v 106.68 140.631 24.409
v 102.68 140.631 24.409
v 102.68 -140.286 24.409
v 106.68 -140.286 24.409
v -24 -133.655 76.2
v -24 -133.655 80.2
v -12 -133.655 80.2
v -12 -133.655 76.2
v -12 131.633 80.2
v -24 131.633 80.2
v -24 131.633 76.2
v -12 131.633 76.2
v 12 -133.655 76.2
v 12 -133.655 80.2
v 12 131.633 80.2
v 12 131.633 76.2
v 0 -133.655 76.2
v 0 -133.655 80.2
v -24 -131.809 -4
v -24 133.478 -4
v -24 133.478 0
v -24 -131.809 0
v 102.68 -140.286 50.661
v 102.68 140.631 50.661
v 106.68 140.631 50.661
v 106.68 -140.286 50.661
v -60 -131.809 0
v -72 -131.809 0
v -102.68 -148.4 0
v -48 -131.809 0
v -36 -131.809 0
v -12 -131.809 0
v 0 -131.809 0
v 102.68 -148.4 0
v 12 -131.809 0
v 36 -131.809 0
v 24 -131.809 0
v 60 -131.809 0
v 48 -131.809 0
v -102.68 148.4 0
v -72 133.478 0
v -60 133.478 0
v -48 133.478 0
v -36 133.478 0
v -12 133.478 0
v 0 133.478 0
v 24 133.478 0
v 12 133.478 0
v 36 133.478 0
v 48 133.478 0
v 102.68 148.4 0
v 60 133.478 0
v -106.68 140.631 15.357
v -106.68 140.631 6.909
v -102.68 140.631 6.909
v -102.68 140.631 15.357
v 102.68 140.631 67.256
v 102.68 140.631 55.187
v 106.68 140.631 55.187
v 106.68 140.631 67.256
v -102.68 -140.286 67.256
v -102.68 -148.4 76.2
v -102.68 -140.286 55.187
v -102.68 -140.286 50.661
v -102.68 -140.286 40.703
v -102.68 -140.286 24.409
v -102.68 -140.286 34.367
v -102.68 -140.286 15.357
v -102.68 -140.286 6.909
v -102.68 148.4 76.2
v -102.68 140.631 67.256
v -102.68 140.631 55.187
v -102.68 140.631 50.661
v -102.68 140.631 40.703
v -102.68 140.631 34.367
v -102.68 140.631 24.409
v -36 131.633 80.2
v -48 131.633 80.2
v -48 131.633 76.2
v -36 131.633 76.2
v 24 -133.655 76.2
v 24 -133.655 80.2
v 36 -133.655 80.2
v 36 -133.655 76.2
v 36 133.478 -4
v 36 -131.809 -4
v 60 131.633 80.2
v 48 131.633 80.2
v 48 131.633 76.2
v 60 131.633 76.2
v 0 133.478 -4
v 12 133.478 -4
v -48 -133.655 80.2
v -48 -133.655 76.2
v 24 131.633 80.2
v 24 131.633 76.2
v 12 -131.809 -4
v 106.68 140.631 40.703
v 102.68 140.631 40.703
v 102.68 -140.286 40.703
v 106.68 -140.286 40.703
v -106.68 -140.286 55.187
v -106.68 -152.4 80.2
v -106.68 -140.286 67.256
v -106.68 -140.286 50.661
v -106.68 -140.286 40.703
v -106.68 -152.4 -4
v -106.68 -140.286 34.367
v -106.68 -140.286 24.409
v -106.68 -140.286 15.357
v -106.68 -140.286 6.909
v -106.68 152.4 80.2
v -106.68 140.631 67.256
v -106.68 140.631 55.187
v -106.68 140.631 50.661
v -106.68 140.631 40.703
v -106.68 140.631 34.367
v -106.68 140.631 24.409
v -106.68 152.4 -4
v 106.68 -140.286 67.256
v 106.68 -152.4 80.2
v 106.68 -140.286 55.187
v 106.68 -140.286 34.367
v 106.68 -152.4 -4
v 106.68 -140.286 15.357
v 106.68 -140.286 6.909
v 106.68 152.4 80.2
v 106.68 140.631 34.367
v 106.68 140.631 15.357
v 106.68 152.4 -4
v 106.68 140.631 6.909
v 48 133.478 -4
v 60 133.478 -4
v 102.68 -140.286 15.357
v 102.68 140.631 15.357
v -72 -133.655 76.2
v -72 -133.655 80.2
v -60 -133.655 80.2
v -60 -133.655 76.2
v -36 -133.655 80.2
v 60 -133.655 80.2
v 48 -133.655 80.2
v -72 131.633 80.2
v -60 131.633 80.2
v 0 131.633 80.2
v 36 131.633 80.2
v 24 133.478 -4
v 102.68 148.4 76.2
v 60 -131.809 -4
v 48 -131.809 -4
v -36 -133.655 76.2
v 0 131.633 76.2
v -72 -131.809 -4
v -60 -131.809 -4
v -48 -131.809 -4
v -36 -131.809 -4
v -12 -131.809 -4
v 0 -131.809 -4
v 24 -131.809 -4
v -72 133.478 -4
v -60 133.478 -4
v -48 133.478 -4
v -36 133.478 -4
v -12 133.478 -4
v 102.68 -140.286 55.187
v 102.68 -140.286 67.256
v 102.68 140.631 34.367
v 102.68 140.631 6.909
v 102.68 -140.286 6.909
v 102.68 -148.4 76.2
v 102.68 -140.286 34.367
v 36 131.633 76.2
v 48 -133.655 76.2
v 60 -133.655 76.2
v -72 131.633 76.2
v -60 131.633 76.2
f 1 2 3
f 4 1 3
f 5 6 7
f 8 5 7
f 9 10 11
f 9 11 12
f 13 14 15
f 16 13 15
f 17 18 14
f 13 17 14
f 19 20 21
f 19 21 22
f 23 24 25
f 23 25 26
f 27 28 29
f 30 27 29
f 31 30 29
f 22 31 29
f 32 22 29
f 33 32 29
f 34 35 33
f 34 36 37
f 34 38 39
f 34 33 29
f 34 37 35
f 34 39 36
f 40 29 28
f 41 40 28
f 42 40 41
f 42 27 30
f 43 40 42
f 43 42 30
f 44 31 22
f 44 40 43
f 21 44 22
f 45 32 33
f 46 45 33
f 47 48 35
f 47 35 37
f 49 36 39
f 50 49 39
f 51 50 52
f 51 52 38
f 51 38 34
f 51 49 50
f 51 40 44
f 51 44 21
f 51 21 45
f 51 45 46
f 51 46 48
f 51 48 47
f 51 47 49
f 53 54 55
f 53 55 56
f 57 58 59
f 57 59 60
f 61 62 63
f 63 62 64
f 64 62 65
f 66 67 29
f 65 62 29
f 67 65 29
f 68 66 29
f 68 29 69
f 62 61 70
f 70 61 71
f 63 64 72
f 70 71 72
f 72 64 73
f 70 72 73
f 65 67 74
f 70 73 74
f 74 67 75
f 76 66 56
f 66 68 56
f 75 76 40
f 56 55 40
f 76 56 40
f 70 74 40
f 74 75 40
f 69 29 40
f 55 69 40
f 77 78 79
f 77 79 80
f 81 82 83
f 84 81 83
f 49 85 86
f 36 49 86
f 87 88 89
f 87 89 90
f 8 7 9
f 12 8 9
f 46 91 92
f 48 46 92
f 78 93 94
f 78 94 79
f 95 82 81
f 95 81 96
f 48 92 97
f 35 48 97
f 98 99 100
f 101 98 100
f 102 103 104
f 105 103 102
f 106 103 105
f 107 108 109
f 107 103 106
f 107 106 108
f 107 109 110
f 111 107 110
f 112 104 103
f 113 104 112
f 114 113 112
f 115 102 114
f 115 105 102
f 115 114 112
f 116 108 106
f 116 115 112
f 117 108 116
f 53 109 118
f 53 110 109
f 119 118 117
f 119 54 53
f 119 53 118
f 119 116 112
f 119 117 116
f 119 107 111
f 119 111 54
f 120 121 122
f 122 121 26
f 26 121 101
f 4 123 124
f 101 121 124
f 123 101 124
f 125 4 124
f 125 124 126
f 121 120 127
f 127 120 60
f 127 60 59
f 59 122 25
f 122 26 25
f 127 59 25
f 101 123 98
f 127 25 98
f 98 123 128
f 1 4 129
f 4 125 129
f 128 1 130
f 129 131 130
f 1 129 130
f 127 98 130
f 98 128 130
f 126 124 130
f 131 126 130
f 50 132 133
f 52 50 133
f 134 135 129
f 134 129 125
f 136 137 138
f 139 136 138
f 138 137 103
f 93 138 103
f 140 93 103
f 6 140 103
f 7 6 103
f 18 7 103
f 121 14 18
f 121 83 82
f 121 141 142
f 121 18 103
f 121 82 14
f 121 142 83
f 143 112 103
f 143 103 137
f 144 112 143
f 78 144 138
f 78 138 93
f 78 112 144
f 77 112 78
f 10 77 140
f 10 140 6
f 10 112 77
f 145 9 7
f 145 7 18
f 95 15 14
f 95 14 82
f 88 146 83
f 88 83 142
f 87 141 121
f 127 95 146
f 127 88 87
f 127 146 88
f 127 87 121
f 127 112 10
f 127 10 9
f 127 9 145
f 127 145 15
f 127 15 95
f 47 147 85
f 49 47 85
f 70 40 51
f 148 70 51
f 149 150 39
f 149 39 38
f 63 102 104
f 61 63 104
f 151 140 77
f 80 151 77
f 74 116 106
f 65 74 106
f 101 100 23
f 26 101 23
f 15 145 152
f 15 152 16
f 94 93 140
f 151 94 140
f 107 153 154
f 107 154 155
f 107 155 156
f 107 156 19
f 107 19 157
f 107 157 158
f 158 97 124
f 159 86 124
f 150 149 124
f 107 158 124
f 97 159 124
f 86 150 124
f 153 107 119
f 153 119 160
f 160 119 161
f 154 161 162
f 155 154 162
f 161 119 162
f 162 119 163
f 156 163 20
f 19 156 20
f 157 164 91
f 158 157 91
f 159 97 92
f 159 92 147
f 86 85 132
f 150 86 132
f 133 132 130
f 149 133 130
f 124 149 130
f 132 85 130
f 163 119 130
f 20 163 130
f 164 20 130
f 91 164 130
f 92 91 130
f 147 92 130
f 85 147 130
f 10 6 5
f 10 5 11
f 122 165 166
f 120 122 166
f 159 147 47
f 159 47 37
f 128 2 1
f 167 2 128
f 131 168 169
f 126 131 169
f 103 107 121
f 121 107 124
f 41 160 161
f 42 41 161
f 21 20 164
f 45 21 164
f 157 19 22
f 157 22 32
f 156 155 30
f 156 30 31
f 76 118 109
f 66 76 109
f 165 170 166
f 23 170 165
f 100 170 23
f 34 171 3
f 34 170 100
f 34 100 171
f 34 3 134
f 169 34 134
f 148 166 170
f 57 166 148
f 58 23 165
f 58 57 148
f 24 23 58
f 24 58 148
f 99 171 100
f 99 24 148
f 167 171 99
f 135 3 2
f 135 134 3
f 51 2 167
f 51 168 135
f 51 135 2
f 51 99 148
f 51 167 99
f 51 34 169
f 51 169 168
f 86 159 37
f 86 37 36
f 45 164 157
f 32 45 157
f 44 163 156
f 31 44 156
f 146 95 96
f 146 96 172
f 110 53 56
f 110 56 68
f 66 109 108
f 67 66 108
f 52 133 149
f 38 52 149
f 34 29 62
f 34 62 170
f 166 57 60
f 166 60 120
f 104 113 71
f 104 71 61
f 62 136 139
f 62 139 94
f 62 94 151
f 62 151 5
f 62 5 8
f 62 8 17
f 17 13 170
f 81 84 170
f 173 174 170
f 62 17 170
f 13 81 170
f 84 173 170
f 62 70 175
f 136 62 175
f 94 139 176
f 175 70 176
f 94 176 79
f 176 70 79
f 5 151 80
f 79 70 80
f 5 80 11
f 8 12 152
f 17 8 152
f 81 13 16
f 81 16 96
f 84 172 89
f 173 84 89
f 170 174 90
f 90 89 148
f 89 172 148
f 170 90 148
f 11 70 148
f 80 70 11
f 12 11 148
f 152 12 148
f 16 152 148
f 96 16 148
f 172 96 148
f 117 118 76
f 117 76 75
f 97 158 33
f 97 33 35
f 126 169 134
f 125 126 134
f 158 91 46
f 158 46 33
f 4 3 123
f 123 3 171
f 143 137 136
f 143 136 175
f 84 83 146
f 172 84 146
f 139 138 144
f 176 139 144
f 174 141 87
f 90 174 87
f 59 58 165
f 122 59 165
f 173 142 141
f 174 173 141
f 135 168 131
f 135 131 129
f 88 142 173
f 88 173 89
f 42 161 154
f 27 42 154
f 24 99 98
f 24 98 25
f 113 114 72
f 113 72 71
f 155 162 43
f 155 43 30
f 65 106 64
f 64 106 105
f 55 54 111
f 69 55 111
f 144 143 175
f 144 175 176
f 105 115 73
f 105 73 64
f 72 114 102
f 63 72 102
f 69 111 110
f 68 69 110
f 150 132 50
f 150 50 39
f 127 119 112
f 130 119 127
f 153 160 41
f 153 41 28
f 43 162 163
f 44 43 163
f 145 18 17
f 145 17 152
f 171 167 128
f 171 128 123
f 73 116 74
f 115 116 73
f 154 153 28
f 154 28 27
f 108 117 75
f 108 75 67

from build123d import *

# Parameters (mm, degrees)
F0_W      = 213.36
F0_H      = 304.8
F0_W_2    = 205.36
F0_H_2    = 296.8
F1_DEPTH  = 4
F2_DEPTH  = 76.2
F3_W      = 213.36
F3_H      = 304.8
F3_W_2    = 205.36
F3_H_2    = 296.8
F4_DEPTH  = 4
F5_W      = 12
F5_H      = 265.28765991
F6_DEPTH  = 5.08
F7_W      = 12
F7_H      = 265.28765991
F8_DEPTH  = 5.08
F9_W      = 280.9167951345
F9_H      = 12.0694674551
F9_H_2    = 9.9573098123
F9_H_3    = 9.957306087
F9_H_4    = 8.4486240521
F10_DEPTH = 287.02


with BuildPart() as f1:
    # F0 (on Top) → F1 (new body)
    with BuildSketch(Plane.XY):
        Rectangle(F0_W, F0_H)
        Rectangle(F0_W_2, F0_H_2, mode=Mode.SUBTRACT)
        Rectangle(F0_W_2, F0_H_2)
    extrude(amount=-F1_DEPTH)

    # F0 (on Top) → F2 (join)
    with BuildSketch(Plane.XY):
        Rectangle(F0_W, F0_H)
        Rectangle(F0_W_2, F0_H_2, mode=Mode.SUBTRACT)
    extrude(amount=F2_DEPTH)

    # F3 (on face) → F4 (join)
    with BuildSketch(Plane.XY.offset(76.2)):
        Rectangle(F3_W, F3_H)
        Rectangle(F3_W_2, F3_H_2, mode=Mode.SUBTRACT)
        Rectangle(F3_W_2, F3_H_2)
    extrude(amount=F4_DEPTH)

    # F5 (on face) → F6 (cut)
    with BuildSketch(Plane.XY.offset(80.2)):
        with Locations((-66, -1.0106861591)):
            Rectangle(F5_W, F5_H)
        with Locations((-42, -1.0106861591)):
            Rectangle(F5_W, F5_H)
        with Locations((-18, -1.0106861591)):
            Rectangle(F5_W, F5_H)
        with Locations((6, -1.0106861591)):
            Rectangle(F5_W, F5_H)
        with Locations((30, -1.0106861591)):
            Rectangle(F5_W, F5_H)
        with Locations((54, -1.0106861591)):
            Rectangle(F5_W, F5_H)
    extrude(amount=-F6_DEPTH, mode=Mode.SUBTRACT)

    # F7 (on face) → F8 (cut)
    with BuildSketch(Plane(origin=(0, 0, -4), x_dir=(1, 0, 0), z_dir=(0, 0, -1))):
        with Locations((-66, -0.8343393173)):
            Rectangle(F7_W, F7_H)
        with Locations((-42, -0.8343393173)):
            Rectangle(F7_W, F7_H)
        with Locations((-18, -0.8343393173)):
            Rectangle(F7_W, F7_H)
        with Locations((6, -0.8343393173)):
            Rectangle(F7_W, F7_H)
        with Locations((30, -0.8343393173)):
            Rectangle(F7_W, F7_H)
        with Locations((54, -0.8343393173)):
            Rectangle(F7_W, F7_H)
    extrude(amount=-F8_DEPTH, mode=Mode.SUBTRACT)

    # F9 (on face) → F10 (cut)
    with BuildSketch(Plane(origin=(-106.68, 0, 0), x_dir=(0, -1, 0), z_dir=(-1, 0, 0))):
        with Locations((-0.1723989844, 61.221299693)):
            Rectangle(F9_W, F9_H)
        with Locations((-0.1723989844, 45.6818621606)):
            Rectangle(F9_W, F9_H_2)
        with Locations((-0.1723989844, 29.3880850077)):
            Rectangle(F9_W, F9_H_3)
        with Locations((-0.1723989844, 11.1330202781)):
            Rectangle(F9_W, F9_H_4)
    extrude(amount=-F10_DEPTH, mode=Mode.SUBTRACT)


solid = f1.part
